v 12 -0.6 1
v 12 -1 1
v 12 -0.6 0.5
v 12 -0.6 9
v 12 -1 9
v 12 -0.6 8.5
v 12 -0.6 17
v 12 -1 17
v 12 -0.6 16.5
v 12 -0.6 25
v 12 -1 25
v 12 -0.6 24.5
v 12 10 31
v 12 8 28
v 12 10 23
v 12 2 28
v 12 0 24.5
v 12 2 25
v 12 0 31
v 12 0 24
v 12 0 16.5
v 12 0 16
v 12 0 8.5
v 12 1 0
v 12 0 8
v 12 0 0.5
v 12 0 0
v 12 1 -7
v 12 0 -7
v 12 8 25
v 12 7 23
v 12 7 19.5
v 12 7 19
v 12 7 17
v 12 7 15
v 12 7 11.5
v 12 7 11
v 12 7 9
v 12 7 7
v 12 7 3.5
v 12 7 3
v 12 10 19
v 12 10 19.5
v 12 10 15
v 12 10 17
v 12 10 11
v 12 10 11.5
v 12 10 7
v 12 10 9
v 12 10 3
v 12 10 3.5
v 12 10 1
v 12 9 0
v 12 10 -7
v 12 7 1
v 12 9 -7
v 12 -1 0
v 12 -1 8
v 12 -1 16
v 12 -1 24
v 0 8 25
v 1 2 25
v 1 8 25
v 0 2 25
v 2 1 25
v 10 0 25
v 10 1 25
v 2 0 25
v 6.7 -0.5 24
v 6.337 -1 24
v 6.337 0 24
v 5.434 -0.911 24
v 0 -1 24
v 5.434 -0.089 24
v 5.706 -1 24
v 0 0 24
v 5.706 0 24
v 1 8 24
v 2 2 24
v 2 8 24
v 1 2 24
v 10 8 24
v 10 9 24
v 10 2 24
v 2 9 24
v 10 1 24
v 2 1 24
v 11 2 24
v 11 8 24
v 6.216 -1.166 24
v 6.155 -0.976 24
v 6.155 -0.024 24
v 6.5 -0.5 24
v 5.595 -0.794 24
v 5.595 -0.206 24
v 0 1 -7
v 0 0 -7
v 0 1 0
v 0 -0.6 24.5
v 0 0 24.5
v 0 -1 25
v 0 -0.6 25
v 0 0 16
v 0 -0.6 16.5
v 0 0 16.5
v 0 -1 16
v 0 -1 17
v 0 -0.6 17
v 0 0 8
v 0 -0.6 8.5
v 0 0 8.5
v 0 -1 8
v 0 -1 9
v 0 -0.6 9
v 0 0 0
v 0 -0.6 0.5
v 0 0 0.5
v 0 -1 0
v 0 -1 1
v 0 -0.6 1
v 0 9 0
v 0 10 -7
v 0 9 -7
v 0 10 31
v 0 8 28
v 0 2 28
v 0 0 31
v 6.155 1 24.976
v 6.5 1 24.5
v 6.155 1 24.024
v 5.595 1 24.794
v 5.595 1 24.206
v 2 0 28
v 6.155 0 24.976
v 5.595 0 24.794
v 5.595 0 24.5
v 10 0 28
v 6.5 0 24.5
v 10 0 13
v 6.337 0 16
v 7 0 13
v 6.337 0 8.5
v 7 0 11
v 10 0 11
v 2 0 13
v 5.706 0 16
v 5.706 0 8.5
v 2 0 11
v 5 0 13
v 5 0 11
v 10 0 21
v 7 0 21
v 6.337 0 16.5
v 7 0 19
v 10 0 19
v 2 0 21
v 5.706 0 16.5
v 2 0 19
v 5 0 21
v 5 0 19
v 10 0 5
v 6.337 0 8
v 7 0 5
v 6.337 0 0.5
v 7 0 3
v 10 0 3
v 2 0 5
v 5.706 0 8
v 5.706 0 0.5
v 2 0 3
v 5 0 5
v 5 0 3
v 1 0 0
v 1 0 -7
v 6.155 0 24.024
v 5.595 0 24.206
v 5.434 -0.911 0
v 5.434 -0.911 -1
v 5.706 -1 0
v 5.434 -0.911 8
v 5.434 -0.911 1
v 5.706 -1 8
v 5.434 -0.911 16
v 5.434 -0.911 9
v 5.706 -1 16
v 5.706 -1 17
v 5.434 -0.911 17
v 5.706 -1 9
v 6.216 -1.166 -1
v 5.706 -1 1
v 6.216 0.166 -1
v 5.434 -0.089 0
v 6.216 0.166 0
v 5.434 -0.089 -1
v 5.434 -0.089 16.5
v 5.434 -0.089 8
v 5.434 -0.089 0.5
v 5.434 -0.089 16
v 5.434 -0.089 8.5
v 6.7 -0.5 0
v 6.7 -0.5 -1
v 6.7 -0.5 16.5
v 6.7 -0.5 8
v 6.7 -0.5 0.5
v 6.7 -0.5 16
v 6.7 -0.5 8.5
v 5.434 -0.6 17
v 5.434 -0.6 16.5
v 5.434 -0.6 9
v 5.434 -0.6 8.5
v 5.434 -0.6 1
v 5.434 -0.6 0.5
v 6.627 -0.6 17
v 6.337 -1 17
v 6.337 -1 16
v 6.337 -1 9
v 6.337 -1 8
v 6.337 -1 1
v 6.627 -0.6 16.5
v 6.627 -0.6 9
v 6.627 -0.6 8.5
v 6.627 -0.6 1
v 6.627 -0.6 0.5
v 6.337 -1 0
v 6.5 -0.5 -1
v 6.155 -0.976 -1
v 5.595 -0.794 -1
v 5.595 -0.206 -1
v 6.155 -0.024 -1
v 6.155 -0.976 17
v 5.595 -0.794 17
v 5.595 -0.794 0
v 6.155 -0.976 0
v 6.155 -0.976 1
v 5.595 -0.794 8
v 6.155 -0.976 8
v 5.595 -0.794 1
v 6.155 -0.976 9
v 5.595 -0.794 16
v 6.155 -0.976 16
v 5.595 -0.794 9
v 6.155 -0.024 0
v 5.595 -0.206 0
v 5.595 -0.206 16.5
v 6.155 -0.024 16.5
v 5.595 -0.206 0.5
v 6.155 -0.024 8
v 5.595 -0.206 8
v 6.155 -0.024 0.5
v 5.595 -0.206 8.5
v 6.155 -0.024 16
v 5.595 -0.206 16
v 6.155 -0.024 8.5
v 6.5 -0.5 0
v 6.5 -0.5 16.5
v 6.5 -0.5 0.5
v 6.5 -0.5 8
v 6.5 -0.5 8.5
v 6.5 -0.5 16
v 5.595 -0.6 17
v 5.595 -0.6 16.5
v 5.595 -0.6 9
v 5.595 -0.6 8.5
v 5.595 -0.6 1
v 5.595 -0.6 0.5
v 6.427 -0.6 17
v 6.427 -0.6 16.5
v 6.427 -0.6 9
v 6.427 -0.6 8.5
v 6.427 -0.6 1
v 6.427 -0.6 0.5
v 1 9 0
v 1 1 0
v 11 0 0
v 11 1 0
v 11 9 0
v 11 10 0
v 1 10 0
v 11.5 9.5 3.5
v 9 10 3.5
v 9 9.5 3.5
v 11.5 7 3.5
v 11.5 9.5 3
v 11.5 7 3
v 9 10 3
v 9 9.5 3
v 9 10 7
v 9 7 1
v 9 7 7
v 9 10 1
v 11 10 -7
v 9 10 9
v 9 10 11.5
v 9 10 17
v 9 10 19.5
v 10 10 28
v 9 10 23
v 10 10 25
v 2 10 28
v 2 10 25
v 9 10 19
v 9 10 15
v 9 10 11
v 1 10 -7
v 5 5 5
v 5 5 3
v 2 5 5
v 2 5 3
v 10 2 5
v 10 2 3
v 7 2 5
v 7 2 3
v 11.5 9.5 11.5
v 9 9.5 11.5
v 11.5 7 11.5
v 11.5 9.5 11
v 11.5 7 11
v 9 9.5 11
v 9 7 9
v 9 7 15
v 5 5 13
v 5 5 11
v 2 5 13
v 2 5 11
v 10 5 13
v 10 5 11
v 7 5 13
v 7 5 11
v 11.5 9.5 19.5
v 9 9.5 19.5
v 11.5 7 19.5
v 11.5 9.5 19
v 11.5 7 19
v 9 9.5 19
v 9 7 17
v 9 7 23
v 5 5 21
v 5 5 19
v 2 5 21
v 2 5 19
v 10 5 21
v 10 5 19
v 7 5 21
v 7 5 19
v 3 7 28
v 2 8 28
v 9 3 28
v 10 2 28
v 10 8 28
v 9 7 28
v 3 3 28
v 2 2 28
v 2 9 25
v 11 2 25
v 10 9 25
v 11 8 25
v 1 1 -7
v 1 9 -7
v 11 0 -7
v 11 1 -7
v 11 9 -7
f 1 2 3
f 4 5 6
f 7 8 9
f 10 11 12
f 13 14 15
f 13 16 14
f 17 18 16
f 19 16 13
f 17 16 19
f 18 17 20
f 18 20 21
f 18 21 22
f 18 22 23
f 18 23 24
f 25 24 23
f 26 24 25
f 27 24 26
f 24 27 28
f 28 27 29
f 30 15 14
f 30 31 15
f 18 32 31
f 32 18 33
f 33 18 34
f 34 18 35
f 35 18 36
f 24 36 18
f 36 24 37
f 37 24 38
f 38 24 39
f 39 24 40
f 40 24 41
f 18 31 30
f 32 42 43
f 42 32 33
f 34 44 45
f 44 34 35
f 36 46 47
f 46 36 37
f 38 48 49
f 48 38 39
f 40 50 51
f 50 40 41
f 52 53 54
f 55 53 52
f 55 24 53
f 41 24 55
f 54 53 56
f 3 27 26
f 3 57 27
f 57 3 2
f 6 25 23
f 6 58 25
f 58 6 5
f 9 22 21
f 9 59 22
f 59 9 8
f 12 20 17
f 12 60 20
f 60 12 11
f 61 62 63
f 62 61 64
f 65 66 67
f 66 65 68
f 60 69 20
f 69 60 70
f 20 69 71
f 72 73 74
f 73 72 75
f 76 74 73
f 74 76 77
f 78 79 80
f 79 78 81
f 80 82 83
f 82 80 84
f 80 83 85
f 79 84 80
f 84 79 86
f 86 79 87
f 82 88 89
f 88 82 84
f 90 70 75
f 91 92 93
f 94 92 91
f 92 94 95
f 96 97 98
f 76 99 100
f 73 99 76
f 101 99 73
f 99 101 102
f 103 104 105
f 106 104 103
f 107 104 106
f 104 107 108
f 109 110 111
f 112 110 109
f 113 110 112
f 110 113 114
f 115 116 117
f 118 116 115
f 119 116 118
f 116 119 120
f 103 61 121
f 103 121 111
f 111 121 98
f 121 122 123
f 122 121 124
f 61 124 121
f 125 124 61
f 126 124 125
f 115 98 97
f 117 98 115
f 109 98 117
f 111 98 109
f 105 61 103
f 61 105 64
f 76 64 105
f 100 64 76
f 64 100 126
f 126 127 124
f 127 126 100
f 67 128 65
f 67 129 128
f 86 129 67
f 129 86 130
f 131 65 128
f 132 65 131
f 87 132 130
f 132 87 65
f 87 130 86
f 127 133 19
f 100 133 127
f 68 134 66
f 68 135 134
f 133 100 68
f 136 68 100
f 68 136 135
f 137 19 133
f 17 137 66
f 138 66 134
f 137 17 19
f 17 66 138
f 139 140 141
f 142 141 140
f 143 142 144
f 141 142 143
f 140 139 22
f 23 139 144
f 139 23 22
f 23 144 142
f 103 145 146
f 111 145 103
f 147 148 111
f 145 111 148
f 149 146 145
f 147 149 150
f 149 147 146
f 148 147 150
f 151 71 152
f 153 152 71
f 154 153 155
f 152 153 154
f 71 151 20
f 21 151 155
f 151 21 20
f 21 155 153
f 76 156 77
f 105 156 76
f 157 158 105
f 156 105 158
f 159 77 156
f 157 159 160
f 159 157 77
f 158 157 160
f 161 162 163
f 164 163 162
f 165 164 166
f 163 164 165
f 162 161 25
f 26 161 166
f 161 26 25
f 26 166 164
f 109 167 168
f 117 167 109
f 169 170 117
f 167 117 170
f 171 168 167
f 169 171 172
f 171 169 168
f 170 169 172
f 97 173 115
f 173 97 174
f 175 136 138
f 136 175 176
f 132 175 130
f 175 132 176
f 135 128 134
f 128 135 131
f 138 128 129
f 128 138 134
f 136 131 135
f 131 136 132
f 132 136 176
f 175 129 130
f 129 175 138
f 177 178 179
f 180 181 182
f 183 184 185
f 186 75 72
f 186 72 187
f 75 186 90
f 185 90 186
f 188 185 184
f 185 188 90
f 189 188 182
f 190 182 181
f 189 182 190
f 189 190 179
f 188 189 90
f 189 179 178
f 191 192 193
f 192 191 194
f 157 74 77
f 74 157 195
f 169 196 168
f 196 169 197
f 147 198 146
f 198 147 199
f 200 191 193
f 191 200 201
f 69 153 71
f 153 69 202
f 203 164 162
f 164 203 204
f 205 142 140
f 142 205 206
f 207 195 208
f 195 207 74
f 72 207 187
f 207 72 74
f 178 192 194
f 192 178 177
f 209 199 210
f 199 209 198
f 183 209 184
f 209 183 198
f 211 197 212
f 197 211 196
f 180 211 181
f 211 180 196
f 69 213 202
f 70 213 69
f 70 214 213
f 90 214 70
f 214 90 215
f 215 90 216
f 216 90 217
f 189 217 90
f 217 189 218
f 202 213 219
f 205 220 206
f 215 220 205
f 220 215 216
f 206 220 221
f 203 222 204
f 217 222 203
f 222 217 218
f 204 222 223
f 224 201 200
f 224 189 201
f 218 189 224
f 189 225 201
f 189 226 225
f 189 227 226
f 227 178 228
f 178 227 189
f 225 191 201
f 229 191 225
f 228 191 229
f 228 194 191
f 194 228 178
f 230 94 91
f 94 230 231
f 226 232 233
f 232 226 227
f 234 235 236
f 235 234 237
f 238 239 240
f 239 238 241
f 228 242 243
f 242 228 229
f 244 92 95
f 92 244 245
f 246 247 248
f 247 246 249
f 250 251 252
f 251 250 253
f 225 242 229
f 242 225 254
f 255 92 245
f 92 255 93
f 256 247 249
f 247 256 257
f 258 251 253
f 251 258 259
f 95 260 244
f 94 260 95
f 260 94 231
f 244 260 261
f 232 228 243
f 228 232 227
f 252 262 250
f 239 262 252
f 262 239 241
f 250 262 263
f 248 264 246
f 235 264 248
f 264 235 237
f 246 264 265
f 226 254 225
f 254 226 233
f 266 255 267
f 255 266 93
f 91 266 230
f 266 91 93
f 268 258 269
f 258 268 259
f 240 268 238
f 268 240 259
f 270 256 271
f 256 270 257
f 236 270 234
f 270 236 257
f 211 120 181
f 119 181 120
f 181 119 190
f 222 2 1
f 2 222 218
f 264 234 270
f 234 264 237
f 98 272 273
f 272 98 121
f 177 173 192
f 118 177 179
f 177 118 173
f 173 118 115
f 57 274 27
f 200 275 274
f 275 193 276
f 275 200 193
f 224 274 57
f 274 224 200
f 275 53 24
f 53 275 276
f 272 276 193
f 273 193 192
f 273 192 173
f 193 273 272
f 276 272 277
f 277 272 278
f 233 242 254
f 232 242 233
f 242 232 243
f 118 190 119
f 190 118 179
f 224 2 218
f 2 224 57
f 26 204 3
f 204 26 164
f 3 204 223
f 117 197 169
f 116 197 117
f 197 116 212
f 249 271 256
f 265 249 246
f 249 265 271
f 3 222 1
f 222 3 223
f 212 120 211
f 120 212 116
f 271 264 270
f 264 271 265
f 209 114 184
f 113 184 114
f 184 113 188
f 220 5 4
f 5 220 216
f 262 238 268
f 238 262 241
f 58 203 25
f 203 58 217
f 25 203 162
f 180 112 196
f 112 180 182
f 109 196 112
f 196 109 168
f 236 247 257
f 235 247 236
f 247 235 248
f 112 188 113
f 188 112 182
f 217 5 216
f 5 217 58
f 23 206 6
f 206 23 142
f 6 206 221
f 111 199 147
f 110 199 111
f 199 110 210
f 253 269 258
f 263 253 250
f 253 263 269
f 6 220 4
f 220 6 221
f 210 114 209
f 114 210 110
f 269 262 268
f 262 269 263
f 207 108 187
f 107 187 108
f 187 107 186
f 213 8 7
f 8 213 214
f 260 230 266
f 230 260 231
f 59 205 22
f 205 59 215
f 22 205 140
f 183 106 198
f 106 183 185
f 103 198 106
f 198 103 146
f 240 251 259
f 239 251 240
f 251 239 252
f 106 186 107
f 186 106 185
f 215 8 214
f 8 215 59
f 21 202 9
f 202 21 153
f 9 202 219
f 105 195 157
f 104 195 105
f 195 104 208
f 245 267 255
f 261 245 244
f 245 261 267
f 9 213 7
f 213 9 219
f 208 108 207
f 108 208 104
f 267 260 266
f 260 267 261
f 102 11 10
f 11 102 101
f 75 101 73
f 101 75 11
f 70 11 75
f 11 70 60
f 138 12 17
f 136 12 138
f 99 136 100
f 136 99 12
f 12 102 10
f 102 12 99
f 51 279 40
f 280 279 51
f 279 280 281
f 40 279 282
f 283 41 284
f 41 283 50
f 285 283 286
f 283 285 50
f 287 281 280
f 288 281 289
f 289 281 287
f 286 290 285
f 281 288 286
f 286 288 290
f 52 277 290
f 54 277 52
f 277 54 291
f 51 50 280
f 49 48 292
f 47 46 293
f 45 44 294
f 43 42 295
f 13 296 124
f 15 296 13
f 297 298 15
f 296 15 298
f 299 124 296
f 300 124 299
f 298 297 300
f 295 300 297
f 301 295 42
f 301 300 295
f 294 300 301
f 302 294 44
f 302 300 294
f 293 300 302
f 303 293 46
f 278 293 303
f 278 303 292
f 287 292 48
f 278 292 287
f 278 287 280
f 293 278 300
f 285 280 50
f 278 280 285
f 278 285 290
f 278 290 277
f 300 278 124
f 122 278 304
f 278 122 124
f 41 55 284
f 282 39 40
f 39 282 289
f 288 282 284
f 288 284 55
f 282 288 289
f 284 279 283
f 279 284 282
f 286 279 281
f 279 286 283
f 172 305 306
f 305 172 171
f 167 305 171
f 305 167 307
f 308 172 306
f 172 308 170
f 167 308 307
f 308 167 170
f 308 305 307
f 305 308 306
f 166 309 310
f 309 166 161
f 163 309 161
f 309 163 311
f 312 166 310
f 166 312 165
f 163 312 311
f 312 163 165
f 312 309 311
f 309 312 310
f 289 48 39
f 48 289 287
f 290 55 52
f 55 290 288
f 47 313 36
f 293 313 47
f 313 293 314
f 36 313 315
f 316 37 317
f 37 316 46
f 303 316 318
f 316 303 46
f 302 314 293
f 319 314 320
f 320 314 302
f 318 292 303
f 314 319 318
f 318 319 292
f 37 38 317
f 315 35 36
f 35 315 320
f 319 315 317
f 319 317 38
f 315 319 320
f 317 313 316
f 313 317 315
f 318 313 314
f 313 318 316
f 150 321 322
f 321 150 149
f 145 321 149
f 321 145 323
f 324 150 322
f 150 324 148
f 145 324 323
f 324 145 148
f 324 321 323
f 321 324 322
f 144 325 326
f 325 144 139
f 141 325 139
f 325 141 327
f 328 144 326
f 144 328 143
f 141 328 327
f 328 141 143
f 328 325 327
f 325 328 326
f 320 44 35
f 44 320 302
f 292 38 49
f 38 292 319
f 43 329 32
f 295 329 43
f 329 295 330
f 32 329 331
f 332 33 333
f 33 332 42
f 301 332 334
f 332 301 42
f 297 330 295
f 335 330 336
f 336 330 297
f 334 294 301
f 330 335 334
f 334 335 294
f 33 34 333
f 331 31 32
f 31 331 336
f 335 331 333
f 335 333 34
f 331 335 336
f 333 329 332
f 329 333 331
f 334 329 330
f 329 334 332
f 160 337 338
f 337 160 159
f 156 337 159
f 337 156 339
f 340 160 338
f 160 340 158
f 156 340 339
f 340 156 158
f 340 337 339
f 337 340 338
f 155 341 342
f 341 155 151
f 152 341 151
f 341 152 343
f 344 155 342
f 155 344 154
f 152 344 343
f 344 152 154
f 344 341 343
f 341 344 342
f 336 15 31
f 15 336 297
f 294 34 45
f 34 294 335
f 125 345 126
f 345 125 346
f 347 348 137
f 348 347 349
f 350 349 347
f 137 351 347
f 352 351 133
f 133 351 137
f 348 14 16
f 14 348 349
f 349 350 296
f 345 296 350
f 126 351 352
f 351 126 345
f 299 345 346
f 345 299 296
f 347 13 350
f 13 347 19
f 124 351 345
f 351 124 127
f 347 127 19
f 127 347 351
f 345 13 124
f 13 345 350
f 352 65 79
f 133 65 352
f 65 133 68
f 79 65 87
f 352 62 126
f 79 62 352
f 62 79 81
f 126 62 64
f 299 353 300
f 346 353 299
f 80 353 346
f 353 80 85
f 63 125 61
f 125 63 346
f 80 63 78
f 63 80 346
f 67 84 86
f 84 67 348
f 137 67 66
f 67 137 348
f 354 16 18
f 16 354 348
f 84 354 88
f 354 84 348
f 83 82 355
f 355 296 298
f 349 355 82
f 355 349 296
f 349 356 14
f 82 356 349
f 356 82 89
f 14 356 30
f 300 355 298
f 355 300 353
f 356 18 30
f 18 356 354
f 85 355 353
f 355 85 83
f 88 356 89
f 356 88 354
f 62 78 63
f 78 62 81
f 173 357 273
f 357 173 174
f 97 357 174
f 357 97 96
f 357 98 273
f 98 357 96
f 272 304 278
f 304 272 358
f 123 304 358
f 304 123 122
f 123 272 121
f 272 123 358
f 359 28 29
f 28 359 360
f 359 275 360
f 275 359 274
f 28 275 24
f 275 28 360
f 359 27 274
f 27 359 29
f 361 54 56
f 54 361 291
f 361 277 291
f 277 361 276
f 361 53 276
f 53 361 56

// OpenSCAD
// House parameters
house_height = 8;
house_width = 12;
house_depth = 10;


// Function to create a house with windows and a balcony
module house_with_windows_and_balcony() {
    
    
   difference(){ 
        translate([9,7,3])
        cube([3,3,0.5]);
       translate([9,7,3])
        cube([2.5,2.5,0.5]);
       
       }
    difference() {
        cube([house_width, house_depth, house_height]);

        translate([2,0,3])
                cube([3,5,2]);
        translate([7,0,3])
                cube([3,2,2]);
        translate([9,7,1])
                cube([3,3,6]);
        //cube([3,3,3]);
        
        //cube([15,15,3]);
    }
    
    ///2ndfloor
    
       difference(){ 
        translate([9,7,3+8])
        cube([3,3,0.5]);
       translate([9,7,3+8])
        cube([2.5,2.5,0.5]);
       
       }
    difference() {
       
       translate([0,0,8])
        cube([house_width, house_depth, house_height]);

        translate([2,0,3+8])
                cube([3,5,2]);
        translate([7,0,3+8])
                cube([3,5,2]);
        translate([9,7,1+8])
                cube([3,3,6]);
        //cube([3,3,3]);
        
        //cube([15,15,3]);
    }
    
        ///3rdfloor
    
       difference(){ 
        translate([9,7,3+16])
        cube([3,3,0.5]);
       translate([9,7,3+16])
        cube([2.5,2.5,0.5]);
       
       }
    difference() {
         translate([0,0,16])
        cube([house_width, house_depth, house_height]);

        translate([2,0,3+16])
                cube([3,5,2]);
        translate([7,0,3+16])
                cube([3,5,2]);
        translate([9,7,1+16])
                cube([3,3,6]);
        //cube([3,3,3]);
        
        //cube([15,15,3]);
    }
    

    
}


//module water_storage(){
    
//    difference(){
//        translate([1.5,-3,-7])
//        cube([9,5,5]);
//        translate([2.5,-2,-5])
//        cube([7,3,3]);
//        }
//}





// Prism parameters
// Prism parameters
base_side_length = 3;
prism_height_we= 10;
prism_height_ns= 12;

// Create a prism with one right angle and rotate it by 90 degrees around the x-axis


mirror([1,0])
    {
translate([-12,10,28])
rotate([90, 0, 0])
    linear_extrude(height = prism_height_we)
        polygon([[0, 0], [base_side_length, 0], [0, base_side_length]]);}

translate([0,10,28])
rotate([90, 0, 0])
    linear_extrude(height = prism_height_we)
        polygon([[0, 0], [base_side_length, 0], [0, base_side_length]]);
        
        
 translate([0,0,28])       
rotate([90, 0, 90])
    linear_extrude(height = prism_height_ns)
        polygon([[0, 0], [base_side_length, 0], [0, base_side_length]]);
        
        
      
  translate([12,10,28])       
rotate([90, 0, -90])
    linear_extrude(height = prism_height_ns)
        polygon([[0, 0], [base_side_length, 0], [0, base_side_length]]);

translate([0,0,24])
cube([2,2,4]);
translate([0,8,24])
cube([2,2,4]);
translate([10,0,24])
cube([2,2,4]);
translate([10,8,24])
cube([2,2,4]);

difference(){
translate([0,0,24])
cube([12,1,1]);
translate([6,2,24.5])
rotate([90,0,0])
cylinder(3,.5,.5);
}
translate([0,9,24])
cube([12,1,1]);
translate([11,0,24])
cube([1,10,1]);
translate([0,0,24])
cube([1,10,1]);


//the pipe
difference(){
translate([6,-.5,-1])
cylinder(25,0.7,0.7);
translate([6,-.5,-1])
cylinder(25,.5,.5);
    

}

//the plant holder
difference(){
translate([0,-1,0])
cube([12,1,1]);
translate([0,-.6,.5])
cube([12,.6,1]);
}

difference(){
translate([0,-1,8])
cube([12,1,1]);
translate([0,-.6,8.5])
cube([12,.6,1]);
}

difference(){
translate([0,-1,16])
cube([12,1,1]);
translate([0,-.6,16.5])
cube([12,.6,1]);
}


difference(){
translate([0,-1,24])
cube([12,1,1]);
translate([0,-.6,24.5])
cube([12,.6,1]);
 sphere(1);   

}

//base foundation

translate([0,0,-7])
cube([1,1,7]);
translate([0,9,-7])
cube([1,1,7]);
translate([11,0,-7])
cube([1,1,7]);
translate([11,9,-7])
cube([1,1,7]);


// Generate the house with windows and a balcony
house_with_windows_and_balcony();
// water_storage();
